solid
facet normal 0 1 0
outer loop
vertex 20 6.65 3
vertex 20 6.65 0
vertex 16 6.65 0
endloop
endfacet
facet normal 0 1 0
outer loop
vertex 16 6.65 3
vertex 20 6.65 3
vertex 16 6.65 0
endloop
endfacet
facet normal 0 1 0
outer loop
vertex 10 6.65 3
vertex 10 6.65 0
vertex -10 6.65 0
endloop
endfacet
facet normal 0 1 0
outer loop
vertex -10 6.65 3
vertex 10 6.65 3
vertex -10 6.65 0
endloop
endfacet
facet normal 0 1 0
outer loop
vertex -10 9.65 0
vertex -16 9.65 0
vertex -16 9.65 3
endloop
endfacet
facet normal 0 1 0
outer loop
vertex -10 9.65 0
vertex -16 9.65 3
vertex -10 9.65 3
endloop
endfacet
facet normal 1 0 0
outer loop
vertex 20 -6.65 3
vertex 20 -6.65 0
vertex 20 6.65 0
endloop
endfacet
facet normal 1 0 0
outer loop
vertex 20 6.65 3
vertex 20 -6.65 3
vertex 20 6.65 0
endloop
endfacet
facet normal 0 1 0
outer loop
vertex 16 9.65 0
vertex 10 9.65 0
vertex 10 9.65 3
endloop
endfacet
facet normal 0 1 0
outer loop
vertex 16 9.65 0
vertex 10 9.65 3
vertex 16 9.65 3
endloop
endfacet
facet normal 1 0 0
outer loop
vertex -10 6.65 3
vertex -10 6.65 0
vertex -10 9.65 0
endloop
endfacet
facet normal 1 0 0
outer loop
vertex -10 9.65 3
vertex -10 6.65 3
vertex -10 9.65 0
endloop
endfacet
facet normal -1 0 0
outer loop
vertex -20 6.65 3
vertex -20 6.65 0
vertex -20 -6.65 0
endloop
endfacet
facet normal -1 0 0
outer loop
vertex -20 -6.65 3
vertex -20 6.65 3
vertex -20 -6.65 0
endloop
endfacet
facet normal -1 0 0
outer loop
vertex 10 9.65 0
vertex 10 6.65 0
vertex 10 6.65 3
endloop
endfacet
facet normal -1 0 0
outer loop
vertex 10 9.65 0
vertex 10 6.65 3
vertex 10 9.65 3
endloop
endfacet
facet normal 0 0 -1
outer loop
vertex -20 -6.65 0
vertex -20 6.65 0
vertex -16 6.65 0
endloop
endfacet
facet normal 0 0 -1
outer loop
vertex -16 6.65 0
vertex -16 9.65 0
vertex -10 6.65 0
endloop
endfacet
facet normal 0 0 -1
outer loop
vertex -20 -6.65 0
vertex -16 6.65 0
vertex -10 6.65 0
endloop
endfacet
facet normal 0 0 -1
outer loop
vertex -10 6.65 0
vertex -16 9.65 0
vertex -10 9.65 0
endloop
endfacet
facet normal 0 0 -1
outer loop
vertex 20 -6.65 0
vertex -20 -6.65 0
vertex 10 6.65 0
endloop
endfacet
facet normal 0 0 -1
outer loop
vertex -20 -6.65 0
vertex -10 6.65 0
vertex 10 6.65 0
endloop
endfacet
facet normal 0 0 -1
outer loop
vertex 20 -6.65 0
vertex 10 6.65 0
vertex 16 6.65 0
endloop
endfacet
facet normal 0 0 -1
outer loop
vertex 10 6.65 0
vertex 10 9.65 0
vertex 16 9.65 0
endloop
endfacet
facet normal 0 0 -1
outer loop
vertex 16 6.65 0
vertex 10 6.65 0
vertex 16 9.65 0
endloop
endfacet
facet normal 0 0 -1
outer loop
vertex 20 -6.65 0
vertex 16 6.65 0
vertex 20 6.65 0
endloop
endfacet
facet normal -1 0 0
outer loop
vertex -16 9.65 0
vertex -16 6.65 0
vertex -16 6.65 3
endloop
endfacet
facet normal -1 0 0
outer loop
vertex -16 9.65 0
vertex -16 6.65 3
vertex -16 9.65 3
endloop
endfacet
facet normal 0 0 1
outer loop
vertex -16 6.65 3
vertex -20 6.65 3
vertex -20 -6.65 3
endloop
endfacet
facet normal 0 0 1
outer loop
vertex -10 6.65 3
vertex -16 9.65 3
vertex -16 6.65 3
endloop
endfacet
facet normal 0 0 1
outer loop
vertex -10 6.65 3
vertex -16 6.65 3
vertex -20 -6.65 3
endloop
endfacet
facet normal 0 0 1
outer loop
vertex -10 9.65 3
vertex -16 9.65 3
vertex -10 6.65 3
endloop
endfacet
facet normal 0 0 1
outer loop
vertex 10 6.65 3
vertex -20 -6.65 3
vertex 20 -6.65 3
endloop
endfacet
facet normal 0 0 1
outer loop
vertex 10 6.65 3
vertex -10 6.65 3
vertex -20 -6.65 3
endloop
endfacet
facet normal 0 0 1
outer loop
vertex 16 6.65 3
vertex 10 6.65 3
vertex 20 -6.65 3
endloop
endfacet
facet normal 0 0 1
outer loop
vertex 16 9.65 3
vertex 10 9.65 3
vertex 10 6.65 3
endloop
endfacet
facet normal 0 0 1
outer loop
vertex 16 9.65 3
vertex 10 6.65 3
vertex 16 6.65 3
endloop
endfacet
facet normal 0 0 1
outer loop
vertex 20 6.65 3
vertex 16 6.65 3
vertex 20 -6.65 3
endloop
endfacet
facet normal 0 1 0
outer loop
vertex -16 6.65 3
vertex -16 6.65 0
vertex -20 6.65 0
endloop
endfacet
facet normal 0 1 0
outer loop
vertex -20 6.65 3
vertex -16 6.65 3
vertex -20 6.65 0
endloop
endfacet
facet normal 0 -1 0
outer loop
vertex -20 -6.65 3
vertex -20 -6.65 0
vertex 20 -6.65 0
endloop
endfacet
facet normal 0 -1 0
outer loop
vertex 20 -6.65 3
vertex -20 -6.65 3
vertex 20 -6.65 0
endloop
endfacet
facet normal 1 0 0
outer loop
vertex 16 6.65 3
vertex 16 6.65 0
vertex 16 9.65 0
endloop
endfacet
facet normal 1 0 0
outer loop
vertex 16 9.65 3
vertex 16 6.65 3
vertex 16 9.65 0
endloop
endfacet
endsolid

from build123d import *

# Parameters (mm, degrees)
SKETCH1_W           = 6
SKETCH1_H           = 3
BOSS_EXTRUDE1_DEPTH = 3


with BuildPart() as part:
    # Sketch1 → Boss-Extrude1 (new body)
    with BuildSketch(Plane.XY):
        Polygon((0, -6.65), (0, 6.65), (-10, 6.65), (-16, 6.65), (-20, 6.65), (-20, -6.65), align=None)
        Polygon((10, 6.65), (0, 6.65), (0, -6.65), (20, -6.65), (20, 6.65), (16, 6.65), align=None)
        with Locations((13, 8.15)):
            Rectangle(SKETCH1_W, SKETCH1_H)
        with Locations((-13, 8.15)):
            Rectangle(SKETCH1_W, SKETCH1_H)
    extrude(amount=BOSS_EXTRUDE1_DEPTH)


solid = part.part
